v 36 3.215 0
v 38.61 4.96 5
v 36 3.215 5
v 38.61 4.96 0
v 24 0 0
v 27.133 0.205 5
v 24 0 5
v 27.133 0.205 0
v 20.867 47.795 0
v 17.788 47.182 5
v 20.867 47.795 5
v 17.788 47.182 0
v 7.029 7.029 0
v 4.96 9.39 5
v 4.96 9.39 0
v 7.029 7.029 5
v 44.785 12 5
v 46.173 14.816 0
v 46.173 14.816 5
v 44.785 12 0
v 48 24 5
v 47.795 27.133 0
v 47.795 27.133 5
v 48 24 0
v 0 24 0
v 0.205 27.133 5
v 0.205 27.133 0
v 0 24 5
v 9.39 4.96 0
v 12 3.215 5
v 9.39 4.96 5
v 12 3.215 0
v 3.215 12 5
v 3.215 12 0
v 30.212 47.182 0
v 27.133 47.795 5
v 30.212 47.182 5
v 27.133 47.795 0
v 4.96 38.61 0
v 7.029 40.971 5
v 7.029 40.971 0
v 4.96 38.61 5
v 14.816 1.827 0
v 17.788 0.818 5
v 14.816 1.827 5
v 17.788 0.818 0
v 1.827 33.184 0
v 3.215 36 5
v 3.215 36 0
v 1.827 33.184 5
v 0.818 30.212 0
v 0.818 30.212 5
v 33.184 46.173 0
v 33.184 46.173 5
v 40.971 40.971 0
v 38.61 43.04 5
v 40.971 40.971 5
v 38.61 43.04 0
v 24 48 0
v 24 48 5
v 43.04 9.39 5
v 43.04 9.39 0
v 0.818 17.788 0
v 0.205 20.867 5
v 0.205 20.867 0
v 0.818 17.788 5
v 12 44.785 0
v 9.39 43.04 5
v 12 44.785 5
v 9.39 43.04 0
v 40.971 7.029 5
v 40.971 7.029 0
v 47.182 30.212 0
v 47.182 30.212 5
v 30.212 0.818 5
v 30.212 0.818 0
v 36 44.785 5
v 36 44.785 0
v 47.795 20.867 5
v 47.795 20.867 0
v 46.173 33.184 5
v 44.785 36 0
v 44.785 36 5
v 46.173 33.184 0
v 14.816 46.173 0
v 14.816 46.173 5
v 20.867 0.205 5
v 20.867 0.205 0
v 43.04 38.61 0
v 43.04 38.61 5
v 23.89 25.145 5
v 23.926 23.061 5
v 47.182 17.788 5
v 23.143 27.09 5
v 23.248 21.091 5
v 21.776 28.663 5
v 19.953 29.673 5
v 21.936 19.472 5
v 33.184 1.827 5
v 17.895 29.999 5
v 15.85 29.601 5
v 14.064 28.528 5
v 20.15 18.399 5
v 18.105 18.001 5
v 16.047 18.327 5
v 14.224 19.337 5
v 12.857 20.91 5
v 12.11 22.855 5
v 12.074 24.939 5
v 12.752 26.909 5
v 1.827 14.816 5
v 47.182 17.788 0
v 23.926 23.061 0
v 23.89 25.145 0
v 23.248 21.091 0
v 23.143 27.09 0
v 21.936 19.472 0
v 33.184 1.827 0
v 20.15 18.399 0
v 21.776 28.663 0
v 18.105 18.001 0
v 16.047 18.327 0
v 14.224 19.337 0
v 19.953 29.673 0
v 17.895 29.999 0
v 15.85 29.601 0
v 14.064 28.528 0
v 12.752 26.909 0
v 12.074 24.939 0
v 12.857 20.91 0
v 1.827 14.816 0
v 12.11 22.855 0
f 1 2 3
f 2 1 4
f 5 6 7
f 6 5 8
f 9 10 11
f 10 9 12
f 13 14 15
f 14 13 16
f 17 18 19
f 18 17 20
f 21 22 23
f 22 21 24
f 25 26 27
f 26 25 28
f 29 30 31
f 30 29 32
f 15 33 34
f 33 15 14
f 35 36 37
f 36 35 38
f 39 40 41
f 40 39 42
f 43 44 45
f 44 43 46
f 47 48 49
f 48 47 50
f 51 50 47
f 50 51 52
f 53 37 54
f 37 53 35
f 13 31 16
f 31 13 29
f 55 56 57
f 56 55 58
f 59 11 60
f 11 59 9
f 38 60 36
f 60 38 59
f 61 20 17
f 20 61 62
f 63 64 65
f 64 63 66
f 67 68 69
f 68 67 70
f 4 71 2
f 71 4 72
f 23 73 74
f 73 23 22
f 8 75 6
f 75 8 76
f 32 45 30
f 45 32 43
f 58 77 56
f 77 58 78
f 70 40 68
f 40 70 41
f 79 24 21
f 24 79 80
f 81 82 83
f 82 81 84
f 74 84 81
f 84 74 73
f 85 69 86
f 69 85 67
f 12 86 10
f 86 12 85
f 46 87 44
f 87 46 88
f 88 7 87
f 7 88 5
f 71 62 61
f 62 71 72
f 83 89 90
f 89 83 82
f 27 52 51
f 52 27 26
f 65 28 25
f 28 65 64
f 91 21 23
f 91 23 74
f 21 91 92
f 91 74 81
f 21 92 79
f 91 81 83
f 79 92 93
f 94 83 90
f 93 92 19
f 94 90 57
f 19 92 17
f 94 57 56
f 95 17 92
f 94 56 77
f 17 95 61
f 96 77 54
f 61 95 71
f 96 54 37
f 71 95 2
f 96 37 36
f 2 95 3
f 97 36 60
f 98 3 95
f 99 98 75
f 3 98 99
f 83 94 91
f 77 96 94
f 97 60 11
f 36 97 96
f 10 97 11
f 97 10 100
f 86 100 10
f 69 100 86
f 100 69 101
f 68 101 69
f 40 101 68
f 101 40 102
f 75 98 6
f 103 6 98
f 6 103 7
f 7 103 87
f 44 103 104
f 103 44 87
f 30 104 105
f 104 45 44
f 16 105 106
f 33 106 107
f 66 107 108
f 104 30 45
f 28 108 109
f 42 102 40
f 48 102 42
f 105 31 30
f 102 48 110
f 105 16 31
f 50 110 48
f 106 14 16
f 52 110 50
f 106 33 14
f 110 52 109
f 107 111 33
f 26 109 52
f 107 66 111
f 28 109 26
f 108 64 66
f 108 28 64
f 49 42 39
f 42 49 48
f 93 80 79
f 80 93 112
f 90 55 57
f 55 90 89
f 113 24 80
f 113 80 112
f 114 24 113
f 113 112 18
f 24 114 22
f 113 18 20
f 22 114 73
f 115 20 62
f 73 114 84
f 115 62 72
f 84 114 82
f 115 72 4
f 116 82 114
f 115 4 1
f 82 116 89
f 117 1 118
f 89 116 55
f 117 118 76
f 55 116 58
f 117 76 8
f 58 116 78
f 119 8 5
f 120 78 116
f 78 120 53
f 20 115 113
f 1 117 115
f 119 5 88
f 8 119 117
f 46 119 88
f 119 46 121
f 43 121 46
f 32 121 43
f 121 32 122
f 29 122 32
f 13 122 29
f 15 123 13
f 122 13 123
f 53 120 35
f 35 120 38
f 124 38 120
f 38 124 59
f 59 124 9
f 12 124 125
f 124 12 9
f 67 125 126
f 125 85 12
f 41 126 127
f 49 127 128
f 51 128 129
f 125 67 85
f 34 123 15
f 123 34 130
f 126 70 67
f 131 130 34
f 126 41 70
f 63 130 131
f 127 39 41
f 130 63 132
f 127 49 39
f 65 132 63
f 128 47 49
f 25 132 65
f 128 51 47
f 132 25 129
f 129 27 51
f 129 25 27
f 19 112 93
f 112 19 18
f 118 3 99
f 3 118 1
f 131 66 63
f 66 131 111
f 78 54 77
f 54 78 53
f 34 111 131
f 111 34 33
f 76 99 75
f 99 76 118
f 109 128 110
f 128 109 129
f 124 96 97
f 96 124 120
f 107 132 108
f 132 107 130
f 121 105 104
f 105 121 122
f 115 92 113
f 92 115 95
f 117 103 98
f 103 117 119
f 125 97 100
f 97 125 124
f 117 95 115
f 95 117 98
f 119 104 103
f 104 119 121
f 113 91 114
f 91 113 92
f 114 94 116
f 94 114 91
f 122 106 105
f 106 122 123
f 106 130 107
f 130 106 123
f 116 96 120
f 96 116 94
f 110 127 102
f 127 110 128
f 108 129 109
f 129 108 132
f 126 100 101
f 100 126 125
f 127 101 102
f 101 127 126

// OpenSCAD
$fn = 32;

// ----------------------------------------------------------------------
// Cam plate: eccentric cam, base R24
// ----------------------------------------------------------------------

// --- parameters (mm) ---
base_r = 24;              // base circle radius
lobe_h = 8;               // cam lobe rise
bore_r = 6;               // shaft bore radius
plate_t = 5;              // plate thickness, Z (extrusion height)
ecc = 6;                  // disc eccentricity

profile = [[48, 24], [47.795, 27.133], [47.182, 30.212], [46.173, 33.184], [44.785, 36], [43.04, 38.61], [40.971, 40.971], [38.61, 43.04], [36, 44.785], [33.184, 46.173], [30.212, 47.182], [27.133, 47.795], [24, 48], [20.867, 47.795], [17.788, 47.182], [14.816, 46.173], [12, 44.785], [9.39, 43.04], [7.029, 40.971], [4.96, 38.61], [3.215, 36], [1.827, 33.184], [0.818, 30.212], [0.205, 27.133], [0, 24], [0.205, 20.867], [0.818, 17.788], [1.827, 14.816], [3.215, 12], [4.96, 9.39], [7.029, 7.029], [9.39, 4.96], [12, 3.215], [14.816, 1.827], [17.788, 0.818], [20.867, 0.205], [24, 0], [27.133, 0.205], [30.212, 0.818], [33.184, 1.827], [36, 3.215], [38.61, 4.96], [40.971, 7.029], [43.04, 9.39], [44.785, 12], [46.173, 14.816], [47.182, 17.788], [47.795, 20.867]];  // primary outline, 48 points, counter clockwise
void_1 = [[23.89, 25.145], [23.143, 27.09], [21.776, 28.663], [19.953, 29.673], [17.895, 29.999], [15.85, 29.601], [14.064, 28.528], [12.752, 26.909], [12.074, 24.939], [12.11, 22.855], [12.857, 20.91], [14.224, 19.337], [16.047, 18.327], [18.105, 18.001], [20.15, 18.399], [21.936, 19.472], [23.248, 21.091], [23.926, 23.061]];  // shaft bore, 18 points

// --- the one profile operation ---
difference() {
  linear_extrude(height = plate_t) polygon(points = profile);
  translate([0, 0, -1])
    linear_extrude(height = plate_t + 2) polygon(points = void_1);
}
